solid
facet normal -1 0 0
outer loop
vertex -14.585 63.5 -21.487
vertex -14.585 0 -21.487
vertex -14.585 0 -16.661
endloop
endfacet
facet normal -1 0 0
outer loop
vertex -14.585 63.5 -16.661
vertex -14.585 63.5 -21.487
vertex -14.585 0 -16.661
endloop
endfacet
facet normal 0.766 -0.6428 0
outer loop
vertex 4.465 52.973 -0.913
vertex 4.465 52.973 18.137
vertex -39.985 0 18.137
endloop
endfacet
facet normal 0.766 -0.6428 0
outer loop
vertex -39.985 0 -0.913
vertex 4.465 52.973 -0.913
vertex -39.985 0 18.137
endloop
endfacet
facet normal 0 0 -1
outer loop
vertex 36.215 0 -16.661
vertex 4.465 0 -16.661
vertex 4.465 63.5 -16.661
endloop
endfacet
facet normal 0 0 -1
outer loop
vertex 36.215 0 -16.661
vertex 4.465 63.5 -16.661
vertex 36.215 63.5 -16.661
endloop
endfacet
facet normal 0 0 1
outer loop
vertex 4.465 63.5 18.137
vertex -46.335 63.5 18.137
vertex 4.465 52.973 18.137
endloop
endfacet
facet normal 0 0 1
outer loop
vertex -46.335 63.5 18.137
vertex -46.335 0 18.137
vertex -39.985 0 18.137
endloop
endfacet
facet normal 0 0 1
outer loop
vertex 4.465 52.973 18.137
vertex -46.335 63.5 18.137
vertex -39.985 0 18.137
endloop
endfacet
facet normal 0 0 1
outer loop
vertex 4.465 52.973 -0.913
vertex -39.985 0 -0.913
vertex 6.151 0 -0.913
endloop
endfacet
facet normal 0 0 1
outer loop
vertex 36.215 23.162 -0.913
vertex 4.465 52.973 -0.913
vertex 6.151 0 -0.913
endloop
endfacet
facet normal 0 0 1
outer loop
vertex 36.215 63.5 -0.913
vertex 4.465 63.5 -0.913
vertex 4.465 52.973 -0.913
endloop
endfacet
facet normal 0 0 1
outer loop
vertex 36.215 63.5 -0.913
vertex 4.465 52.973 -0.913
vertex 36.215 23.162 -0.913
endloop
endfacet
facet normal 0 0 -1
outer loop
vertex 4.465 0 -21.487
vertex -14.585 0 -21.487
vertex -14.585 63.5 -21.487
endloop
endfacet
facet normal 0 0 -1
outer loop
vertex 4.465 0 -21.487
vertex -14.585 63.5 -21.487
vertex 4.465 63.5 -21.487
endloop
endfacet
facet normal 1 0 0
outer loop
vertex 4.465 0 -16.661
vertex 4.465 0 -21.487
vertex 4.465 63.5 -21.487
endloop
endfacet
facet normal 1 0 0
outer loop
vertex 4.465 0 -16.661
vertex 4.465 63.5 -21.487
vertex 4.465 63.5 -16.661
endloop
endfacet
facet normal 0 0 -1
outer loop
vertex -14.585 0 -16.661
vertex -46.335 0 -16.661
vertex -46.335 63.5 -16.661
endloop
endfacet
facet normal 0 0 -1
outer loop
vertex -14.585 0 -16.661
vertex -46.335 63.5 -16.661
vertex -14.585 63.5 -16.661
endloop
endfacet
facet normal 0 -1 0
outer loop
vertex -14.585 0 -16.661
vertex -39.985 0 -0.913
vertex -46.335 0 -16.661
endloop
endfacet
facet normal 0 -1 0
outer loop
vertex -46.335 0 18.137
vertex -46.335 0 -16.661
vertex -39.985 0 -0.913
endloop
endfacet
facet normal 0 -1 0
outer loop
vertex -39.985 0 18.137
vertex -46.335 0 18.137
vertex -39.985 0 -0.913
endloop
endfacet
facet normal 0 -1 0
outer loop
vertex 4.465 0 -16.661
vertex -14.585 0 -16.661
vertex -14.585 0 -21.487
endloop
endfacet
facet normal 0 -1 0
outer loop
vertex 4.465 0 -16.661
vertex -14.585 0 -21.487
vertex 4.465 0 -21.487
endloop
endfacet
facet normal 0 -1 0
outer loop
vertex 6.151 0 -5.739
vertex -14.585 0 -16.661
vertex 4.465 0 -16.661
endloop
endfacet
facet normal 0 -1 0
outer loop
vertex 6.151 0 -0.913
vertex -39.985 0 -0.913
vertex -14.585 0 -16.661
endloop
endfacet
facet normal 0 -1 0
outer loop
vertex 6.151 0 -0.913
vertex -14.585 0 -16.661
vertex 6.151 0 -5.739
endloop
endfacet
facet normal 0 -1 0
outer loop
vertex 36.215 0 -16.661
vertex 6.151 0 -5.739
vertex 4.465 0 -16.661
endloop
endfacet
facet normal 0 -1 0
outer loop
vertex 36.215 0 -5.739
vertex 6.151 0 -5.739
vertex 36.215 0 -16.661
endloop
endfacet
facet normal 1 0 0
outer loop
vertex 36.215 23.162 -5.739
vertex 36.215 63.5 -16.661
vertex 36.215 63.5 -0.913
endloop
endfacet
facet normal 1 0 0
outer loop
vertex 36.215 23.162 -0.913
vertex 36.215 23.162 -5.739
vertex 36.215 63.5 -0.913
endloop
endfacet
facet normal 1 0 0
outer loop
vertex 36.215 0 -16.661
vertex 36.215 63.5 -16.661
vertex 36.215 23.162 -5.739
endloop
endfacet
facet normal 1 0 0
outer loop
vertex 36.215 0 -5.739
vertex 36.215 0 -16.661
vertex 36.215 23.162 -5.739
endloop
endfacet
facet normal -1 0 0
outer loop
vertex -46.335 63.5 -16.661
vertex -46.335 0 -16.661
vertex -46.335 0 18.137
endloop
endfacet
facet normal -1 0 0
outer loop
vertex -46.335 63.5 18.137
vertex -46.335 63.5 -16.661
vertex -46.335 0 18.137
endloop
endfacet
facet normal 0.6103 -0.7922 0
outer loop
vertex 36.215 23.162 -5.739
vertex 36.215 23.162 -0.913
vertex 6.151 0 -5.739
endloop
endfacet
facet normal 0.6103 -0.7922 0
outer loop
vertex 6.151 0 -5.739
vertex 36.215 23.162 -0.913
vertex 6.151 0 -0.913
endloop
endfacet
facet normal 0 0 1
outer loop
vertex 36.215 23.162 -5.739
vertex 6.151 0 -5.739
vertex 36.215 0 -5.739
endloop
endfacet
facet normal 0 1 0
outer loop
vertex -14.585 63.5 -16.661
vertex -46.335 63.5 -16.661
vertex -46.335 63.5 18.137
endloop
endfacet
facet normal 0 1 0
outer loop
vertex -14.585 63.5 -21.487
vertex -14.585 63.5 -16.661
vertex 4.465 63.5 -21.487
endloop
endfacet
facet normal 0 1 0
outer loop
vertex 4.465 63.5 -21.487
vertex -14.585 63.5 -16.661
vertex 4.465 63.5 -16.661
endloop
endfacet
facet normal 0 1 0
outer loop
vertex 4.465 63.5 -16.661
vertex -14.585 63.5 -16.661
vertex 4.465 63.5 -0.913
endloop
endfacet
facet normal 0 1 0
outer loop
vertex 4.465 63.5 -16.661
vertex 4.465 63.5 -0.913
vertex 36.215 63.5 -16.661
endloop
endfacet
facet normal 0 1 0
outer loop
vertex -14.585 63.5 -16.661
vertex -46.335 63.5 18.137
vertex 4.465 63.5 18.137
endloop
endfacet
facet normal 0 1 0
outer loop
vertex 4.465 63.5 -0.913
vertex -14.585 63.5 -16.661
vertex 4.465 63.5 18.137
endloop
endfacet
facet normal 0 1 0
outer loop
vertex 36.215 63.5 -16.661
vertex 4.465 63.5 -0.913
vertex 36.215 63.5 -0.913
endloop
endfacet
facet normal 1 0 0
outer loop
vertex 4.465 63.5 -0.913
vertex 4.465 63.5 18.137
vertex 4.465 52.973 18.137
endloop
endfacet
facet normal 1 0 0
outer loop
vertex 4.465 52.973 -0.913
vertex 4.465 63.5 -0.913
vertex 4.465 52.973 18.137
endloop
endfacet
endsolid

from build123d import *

# Parameters (mm, degrees)
F0_W     = 82.55
F0_H     = 39.624
F1_DEPTH = 63.5
F2_W     = 31.75
F2_H     = 4.826
F3_DEPTH = 153.924
F4_W     = 31.75
F4_H     = 4.826
F5_DEPTH = 83.058
F7_DEPTH = 19.05
F9_DEPTH = 4.826


with BuildPart() as f1:
    # F0 (on Front) → F1 (new body)
    with BuildSketch(Plane.XZ):
        with Locations((-5.060298, -1.674932)):
            Rectangle(F0_W, F0_H)
    extrude(amount=-F1_DEPTH)

    # F2 (on face) → F3 (cut)
    with BuildSketch(Plane.XZ):
        with Locations((-30.460298, -19.073932)):
            Rectangle(F2_W, F2_H)
    extrude(amount=-F3_DEPTH, mode=Mode.SUBTRACT)

    # F4 (on face) → F5 (cut)
    with BuildSketch(Plane.XZ):
        with Locations((20.339702, -19.073932)):
            Rectangle(F4_W, F4_H)
    extrude(amount=-F5_DEPTH, mode=Mode.SUBTRACT)

    # F6 (on face) → F7 (cut)
    with BuildSketch(Plane.XY.offset(18.137068)):
        Polygon((36.214702, 63.5), (4.464702, 63.5), (4.464702, 52.973447), (-39.985298, 0), (36.214702, 0), align=None)
    extrude(amount=-F7_DEPTH, mode=Mode.SUBTRACT)

    # F8 (on face) → F9 (cut)
    with BuildSketch(Plane.XY.offset(-0.912932)):
        Polygon((36.214702, 23.16233), (6.150608, 0), (36.214702, 0), align=None)
    extrude(amount=-F9_DEPTH, mode=Mode.SUBTRACT)


solid = f1.part
